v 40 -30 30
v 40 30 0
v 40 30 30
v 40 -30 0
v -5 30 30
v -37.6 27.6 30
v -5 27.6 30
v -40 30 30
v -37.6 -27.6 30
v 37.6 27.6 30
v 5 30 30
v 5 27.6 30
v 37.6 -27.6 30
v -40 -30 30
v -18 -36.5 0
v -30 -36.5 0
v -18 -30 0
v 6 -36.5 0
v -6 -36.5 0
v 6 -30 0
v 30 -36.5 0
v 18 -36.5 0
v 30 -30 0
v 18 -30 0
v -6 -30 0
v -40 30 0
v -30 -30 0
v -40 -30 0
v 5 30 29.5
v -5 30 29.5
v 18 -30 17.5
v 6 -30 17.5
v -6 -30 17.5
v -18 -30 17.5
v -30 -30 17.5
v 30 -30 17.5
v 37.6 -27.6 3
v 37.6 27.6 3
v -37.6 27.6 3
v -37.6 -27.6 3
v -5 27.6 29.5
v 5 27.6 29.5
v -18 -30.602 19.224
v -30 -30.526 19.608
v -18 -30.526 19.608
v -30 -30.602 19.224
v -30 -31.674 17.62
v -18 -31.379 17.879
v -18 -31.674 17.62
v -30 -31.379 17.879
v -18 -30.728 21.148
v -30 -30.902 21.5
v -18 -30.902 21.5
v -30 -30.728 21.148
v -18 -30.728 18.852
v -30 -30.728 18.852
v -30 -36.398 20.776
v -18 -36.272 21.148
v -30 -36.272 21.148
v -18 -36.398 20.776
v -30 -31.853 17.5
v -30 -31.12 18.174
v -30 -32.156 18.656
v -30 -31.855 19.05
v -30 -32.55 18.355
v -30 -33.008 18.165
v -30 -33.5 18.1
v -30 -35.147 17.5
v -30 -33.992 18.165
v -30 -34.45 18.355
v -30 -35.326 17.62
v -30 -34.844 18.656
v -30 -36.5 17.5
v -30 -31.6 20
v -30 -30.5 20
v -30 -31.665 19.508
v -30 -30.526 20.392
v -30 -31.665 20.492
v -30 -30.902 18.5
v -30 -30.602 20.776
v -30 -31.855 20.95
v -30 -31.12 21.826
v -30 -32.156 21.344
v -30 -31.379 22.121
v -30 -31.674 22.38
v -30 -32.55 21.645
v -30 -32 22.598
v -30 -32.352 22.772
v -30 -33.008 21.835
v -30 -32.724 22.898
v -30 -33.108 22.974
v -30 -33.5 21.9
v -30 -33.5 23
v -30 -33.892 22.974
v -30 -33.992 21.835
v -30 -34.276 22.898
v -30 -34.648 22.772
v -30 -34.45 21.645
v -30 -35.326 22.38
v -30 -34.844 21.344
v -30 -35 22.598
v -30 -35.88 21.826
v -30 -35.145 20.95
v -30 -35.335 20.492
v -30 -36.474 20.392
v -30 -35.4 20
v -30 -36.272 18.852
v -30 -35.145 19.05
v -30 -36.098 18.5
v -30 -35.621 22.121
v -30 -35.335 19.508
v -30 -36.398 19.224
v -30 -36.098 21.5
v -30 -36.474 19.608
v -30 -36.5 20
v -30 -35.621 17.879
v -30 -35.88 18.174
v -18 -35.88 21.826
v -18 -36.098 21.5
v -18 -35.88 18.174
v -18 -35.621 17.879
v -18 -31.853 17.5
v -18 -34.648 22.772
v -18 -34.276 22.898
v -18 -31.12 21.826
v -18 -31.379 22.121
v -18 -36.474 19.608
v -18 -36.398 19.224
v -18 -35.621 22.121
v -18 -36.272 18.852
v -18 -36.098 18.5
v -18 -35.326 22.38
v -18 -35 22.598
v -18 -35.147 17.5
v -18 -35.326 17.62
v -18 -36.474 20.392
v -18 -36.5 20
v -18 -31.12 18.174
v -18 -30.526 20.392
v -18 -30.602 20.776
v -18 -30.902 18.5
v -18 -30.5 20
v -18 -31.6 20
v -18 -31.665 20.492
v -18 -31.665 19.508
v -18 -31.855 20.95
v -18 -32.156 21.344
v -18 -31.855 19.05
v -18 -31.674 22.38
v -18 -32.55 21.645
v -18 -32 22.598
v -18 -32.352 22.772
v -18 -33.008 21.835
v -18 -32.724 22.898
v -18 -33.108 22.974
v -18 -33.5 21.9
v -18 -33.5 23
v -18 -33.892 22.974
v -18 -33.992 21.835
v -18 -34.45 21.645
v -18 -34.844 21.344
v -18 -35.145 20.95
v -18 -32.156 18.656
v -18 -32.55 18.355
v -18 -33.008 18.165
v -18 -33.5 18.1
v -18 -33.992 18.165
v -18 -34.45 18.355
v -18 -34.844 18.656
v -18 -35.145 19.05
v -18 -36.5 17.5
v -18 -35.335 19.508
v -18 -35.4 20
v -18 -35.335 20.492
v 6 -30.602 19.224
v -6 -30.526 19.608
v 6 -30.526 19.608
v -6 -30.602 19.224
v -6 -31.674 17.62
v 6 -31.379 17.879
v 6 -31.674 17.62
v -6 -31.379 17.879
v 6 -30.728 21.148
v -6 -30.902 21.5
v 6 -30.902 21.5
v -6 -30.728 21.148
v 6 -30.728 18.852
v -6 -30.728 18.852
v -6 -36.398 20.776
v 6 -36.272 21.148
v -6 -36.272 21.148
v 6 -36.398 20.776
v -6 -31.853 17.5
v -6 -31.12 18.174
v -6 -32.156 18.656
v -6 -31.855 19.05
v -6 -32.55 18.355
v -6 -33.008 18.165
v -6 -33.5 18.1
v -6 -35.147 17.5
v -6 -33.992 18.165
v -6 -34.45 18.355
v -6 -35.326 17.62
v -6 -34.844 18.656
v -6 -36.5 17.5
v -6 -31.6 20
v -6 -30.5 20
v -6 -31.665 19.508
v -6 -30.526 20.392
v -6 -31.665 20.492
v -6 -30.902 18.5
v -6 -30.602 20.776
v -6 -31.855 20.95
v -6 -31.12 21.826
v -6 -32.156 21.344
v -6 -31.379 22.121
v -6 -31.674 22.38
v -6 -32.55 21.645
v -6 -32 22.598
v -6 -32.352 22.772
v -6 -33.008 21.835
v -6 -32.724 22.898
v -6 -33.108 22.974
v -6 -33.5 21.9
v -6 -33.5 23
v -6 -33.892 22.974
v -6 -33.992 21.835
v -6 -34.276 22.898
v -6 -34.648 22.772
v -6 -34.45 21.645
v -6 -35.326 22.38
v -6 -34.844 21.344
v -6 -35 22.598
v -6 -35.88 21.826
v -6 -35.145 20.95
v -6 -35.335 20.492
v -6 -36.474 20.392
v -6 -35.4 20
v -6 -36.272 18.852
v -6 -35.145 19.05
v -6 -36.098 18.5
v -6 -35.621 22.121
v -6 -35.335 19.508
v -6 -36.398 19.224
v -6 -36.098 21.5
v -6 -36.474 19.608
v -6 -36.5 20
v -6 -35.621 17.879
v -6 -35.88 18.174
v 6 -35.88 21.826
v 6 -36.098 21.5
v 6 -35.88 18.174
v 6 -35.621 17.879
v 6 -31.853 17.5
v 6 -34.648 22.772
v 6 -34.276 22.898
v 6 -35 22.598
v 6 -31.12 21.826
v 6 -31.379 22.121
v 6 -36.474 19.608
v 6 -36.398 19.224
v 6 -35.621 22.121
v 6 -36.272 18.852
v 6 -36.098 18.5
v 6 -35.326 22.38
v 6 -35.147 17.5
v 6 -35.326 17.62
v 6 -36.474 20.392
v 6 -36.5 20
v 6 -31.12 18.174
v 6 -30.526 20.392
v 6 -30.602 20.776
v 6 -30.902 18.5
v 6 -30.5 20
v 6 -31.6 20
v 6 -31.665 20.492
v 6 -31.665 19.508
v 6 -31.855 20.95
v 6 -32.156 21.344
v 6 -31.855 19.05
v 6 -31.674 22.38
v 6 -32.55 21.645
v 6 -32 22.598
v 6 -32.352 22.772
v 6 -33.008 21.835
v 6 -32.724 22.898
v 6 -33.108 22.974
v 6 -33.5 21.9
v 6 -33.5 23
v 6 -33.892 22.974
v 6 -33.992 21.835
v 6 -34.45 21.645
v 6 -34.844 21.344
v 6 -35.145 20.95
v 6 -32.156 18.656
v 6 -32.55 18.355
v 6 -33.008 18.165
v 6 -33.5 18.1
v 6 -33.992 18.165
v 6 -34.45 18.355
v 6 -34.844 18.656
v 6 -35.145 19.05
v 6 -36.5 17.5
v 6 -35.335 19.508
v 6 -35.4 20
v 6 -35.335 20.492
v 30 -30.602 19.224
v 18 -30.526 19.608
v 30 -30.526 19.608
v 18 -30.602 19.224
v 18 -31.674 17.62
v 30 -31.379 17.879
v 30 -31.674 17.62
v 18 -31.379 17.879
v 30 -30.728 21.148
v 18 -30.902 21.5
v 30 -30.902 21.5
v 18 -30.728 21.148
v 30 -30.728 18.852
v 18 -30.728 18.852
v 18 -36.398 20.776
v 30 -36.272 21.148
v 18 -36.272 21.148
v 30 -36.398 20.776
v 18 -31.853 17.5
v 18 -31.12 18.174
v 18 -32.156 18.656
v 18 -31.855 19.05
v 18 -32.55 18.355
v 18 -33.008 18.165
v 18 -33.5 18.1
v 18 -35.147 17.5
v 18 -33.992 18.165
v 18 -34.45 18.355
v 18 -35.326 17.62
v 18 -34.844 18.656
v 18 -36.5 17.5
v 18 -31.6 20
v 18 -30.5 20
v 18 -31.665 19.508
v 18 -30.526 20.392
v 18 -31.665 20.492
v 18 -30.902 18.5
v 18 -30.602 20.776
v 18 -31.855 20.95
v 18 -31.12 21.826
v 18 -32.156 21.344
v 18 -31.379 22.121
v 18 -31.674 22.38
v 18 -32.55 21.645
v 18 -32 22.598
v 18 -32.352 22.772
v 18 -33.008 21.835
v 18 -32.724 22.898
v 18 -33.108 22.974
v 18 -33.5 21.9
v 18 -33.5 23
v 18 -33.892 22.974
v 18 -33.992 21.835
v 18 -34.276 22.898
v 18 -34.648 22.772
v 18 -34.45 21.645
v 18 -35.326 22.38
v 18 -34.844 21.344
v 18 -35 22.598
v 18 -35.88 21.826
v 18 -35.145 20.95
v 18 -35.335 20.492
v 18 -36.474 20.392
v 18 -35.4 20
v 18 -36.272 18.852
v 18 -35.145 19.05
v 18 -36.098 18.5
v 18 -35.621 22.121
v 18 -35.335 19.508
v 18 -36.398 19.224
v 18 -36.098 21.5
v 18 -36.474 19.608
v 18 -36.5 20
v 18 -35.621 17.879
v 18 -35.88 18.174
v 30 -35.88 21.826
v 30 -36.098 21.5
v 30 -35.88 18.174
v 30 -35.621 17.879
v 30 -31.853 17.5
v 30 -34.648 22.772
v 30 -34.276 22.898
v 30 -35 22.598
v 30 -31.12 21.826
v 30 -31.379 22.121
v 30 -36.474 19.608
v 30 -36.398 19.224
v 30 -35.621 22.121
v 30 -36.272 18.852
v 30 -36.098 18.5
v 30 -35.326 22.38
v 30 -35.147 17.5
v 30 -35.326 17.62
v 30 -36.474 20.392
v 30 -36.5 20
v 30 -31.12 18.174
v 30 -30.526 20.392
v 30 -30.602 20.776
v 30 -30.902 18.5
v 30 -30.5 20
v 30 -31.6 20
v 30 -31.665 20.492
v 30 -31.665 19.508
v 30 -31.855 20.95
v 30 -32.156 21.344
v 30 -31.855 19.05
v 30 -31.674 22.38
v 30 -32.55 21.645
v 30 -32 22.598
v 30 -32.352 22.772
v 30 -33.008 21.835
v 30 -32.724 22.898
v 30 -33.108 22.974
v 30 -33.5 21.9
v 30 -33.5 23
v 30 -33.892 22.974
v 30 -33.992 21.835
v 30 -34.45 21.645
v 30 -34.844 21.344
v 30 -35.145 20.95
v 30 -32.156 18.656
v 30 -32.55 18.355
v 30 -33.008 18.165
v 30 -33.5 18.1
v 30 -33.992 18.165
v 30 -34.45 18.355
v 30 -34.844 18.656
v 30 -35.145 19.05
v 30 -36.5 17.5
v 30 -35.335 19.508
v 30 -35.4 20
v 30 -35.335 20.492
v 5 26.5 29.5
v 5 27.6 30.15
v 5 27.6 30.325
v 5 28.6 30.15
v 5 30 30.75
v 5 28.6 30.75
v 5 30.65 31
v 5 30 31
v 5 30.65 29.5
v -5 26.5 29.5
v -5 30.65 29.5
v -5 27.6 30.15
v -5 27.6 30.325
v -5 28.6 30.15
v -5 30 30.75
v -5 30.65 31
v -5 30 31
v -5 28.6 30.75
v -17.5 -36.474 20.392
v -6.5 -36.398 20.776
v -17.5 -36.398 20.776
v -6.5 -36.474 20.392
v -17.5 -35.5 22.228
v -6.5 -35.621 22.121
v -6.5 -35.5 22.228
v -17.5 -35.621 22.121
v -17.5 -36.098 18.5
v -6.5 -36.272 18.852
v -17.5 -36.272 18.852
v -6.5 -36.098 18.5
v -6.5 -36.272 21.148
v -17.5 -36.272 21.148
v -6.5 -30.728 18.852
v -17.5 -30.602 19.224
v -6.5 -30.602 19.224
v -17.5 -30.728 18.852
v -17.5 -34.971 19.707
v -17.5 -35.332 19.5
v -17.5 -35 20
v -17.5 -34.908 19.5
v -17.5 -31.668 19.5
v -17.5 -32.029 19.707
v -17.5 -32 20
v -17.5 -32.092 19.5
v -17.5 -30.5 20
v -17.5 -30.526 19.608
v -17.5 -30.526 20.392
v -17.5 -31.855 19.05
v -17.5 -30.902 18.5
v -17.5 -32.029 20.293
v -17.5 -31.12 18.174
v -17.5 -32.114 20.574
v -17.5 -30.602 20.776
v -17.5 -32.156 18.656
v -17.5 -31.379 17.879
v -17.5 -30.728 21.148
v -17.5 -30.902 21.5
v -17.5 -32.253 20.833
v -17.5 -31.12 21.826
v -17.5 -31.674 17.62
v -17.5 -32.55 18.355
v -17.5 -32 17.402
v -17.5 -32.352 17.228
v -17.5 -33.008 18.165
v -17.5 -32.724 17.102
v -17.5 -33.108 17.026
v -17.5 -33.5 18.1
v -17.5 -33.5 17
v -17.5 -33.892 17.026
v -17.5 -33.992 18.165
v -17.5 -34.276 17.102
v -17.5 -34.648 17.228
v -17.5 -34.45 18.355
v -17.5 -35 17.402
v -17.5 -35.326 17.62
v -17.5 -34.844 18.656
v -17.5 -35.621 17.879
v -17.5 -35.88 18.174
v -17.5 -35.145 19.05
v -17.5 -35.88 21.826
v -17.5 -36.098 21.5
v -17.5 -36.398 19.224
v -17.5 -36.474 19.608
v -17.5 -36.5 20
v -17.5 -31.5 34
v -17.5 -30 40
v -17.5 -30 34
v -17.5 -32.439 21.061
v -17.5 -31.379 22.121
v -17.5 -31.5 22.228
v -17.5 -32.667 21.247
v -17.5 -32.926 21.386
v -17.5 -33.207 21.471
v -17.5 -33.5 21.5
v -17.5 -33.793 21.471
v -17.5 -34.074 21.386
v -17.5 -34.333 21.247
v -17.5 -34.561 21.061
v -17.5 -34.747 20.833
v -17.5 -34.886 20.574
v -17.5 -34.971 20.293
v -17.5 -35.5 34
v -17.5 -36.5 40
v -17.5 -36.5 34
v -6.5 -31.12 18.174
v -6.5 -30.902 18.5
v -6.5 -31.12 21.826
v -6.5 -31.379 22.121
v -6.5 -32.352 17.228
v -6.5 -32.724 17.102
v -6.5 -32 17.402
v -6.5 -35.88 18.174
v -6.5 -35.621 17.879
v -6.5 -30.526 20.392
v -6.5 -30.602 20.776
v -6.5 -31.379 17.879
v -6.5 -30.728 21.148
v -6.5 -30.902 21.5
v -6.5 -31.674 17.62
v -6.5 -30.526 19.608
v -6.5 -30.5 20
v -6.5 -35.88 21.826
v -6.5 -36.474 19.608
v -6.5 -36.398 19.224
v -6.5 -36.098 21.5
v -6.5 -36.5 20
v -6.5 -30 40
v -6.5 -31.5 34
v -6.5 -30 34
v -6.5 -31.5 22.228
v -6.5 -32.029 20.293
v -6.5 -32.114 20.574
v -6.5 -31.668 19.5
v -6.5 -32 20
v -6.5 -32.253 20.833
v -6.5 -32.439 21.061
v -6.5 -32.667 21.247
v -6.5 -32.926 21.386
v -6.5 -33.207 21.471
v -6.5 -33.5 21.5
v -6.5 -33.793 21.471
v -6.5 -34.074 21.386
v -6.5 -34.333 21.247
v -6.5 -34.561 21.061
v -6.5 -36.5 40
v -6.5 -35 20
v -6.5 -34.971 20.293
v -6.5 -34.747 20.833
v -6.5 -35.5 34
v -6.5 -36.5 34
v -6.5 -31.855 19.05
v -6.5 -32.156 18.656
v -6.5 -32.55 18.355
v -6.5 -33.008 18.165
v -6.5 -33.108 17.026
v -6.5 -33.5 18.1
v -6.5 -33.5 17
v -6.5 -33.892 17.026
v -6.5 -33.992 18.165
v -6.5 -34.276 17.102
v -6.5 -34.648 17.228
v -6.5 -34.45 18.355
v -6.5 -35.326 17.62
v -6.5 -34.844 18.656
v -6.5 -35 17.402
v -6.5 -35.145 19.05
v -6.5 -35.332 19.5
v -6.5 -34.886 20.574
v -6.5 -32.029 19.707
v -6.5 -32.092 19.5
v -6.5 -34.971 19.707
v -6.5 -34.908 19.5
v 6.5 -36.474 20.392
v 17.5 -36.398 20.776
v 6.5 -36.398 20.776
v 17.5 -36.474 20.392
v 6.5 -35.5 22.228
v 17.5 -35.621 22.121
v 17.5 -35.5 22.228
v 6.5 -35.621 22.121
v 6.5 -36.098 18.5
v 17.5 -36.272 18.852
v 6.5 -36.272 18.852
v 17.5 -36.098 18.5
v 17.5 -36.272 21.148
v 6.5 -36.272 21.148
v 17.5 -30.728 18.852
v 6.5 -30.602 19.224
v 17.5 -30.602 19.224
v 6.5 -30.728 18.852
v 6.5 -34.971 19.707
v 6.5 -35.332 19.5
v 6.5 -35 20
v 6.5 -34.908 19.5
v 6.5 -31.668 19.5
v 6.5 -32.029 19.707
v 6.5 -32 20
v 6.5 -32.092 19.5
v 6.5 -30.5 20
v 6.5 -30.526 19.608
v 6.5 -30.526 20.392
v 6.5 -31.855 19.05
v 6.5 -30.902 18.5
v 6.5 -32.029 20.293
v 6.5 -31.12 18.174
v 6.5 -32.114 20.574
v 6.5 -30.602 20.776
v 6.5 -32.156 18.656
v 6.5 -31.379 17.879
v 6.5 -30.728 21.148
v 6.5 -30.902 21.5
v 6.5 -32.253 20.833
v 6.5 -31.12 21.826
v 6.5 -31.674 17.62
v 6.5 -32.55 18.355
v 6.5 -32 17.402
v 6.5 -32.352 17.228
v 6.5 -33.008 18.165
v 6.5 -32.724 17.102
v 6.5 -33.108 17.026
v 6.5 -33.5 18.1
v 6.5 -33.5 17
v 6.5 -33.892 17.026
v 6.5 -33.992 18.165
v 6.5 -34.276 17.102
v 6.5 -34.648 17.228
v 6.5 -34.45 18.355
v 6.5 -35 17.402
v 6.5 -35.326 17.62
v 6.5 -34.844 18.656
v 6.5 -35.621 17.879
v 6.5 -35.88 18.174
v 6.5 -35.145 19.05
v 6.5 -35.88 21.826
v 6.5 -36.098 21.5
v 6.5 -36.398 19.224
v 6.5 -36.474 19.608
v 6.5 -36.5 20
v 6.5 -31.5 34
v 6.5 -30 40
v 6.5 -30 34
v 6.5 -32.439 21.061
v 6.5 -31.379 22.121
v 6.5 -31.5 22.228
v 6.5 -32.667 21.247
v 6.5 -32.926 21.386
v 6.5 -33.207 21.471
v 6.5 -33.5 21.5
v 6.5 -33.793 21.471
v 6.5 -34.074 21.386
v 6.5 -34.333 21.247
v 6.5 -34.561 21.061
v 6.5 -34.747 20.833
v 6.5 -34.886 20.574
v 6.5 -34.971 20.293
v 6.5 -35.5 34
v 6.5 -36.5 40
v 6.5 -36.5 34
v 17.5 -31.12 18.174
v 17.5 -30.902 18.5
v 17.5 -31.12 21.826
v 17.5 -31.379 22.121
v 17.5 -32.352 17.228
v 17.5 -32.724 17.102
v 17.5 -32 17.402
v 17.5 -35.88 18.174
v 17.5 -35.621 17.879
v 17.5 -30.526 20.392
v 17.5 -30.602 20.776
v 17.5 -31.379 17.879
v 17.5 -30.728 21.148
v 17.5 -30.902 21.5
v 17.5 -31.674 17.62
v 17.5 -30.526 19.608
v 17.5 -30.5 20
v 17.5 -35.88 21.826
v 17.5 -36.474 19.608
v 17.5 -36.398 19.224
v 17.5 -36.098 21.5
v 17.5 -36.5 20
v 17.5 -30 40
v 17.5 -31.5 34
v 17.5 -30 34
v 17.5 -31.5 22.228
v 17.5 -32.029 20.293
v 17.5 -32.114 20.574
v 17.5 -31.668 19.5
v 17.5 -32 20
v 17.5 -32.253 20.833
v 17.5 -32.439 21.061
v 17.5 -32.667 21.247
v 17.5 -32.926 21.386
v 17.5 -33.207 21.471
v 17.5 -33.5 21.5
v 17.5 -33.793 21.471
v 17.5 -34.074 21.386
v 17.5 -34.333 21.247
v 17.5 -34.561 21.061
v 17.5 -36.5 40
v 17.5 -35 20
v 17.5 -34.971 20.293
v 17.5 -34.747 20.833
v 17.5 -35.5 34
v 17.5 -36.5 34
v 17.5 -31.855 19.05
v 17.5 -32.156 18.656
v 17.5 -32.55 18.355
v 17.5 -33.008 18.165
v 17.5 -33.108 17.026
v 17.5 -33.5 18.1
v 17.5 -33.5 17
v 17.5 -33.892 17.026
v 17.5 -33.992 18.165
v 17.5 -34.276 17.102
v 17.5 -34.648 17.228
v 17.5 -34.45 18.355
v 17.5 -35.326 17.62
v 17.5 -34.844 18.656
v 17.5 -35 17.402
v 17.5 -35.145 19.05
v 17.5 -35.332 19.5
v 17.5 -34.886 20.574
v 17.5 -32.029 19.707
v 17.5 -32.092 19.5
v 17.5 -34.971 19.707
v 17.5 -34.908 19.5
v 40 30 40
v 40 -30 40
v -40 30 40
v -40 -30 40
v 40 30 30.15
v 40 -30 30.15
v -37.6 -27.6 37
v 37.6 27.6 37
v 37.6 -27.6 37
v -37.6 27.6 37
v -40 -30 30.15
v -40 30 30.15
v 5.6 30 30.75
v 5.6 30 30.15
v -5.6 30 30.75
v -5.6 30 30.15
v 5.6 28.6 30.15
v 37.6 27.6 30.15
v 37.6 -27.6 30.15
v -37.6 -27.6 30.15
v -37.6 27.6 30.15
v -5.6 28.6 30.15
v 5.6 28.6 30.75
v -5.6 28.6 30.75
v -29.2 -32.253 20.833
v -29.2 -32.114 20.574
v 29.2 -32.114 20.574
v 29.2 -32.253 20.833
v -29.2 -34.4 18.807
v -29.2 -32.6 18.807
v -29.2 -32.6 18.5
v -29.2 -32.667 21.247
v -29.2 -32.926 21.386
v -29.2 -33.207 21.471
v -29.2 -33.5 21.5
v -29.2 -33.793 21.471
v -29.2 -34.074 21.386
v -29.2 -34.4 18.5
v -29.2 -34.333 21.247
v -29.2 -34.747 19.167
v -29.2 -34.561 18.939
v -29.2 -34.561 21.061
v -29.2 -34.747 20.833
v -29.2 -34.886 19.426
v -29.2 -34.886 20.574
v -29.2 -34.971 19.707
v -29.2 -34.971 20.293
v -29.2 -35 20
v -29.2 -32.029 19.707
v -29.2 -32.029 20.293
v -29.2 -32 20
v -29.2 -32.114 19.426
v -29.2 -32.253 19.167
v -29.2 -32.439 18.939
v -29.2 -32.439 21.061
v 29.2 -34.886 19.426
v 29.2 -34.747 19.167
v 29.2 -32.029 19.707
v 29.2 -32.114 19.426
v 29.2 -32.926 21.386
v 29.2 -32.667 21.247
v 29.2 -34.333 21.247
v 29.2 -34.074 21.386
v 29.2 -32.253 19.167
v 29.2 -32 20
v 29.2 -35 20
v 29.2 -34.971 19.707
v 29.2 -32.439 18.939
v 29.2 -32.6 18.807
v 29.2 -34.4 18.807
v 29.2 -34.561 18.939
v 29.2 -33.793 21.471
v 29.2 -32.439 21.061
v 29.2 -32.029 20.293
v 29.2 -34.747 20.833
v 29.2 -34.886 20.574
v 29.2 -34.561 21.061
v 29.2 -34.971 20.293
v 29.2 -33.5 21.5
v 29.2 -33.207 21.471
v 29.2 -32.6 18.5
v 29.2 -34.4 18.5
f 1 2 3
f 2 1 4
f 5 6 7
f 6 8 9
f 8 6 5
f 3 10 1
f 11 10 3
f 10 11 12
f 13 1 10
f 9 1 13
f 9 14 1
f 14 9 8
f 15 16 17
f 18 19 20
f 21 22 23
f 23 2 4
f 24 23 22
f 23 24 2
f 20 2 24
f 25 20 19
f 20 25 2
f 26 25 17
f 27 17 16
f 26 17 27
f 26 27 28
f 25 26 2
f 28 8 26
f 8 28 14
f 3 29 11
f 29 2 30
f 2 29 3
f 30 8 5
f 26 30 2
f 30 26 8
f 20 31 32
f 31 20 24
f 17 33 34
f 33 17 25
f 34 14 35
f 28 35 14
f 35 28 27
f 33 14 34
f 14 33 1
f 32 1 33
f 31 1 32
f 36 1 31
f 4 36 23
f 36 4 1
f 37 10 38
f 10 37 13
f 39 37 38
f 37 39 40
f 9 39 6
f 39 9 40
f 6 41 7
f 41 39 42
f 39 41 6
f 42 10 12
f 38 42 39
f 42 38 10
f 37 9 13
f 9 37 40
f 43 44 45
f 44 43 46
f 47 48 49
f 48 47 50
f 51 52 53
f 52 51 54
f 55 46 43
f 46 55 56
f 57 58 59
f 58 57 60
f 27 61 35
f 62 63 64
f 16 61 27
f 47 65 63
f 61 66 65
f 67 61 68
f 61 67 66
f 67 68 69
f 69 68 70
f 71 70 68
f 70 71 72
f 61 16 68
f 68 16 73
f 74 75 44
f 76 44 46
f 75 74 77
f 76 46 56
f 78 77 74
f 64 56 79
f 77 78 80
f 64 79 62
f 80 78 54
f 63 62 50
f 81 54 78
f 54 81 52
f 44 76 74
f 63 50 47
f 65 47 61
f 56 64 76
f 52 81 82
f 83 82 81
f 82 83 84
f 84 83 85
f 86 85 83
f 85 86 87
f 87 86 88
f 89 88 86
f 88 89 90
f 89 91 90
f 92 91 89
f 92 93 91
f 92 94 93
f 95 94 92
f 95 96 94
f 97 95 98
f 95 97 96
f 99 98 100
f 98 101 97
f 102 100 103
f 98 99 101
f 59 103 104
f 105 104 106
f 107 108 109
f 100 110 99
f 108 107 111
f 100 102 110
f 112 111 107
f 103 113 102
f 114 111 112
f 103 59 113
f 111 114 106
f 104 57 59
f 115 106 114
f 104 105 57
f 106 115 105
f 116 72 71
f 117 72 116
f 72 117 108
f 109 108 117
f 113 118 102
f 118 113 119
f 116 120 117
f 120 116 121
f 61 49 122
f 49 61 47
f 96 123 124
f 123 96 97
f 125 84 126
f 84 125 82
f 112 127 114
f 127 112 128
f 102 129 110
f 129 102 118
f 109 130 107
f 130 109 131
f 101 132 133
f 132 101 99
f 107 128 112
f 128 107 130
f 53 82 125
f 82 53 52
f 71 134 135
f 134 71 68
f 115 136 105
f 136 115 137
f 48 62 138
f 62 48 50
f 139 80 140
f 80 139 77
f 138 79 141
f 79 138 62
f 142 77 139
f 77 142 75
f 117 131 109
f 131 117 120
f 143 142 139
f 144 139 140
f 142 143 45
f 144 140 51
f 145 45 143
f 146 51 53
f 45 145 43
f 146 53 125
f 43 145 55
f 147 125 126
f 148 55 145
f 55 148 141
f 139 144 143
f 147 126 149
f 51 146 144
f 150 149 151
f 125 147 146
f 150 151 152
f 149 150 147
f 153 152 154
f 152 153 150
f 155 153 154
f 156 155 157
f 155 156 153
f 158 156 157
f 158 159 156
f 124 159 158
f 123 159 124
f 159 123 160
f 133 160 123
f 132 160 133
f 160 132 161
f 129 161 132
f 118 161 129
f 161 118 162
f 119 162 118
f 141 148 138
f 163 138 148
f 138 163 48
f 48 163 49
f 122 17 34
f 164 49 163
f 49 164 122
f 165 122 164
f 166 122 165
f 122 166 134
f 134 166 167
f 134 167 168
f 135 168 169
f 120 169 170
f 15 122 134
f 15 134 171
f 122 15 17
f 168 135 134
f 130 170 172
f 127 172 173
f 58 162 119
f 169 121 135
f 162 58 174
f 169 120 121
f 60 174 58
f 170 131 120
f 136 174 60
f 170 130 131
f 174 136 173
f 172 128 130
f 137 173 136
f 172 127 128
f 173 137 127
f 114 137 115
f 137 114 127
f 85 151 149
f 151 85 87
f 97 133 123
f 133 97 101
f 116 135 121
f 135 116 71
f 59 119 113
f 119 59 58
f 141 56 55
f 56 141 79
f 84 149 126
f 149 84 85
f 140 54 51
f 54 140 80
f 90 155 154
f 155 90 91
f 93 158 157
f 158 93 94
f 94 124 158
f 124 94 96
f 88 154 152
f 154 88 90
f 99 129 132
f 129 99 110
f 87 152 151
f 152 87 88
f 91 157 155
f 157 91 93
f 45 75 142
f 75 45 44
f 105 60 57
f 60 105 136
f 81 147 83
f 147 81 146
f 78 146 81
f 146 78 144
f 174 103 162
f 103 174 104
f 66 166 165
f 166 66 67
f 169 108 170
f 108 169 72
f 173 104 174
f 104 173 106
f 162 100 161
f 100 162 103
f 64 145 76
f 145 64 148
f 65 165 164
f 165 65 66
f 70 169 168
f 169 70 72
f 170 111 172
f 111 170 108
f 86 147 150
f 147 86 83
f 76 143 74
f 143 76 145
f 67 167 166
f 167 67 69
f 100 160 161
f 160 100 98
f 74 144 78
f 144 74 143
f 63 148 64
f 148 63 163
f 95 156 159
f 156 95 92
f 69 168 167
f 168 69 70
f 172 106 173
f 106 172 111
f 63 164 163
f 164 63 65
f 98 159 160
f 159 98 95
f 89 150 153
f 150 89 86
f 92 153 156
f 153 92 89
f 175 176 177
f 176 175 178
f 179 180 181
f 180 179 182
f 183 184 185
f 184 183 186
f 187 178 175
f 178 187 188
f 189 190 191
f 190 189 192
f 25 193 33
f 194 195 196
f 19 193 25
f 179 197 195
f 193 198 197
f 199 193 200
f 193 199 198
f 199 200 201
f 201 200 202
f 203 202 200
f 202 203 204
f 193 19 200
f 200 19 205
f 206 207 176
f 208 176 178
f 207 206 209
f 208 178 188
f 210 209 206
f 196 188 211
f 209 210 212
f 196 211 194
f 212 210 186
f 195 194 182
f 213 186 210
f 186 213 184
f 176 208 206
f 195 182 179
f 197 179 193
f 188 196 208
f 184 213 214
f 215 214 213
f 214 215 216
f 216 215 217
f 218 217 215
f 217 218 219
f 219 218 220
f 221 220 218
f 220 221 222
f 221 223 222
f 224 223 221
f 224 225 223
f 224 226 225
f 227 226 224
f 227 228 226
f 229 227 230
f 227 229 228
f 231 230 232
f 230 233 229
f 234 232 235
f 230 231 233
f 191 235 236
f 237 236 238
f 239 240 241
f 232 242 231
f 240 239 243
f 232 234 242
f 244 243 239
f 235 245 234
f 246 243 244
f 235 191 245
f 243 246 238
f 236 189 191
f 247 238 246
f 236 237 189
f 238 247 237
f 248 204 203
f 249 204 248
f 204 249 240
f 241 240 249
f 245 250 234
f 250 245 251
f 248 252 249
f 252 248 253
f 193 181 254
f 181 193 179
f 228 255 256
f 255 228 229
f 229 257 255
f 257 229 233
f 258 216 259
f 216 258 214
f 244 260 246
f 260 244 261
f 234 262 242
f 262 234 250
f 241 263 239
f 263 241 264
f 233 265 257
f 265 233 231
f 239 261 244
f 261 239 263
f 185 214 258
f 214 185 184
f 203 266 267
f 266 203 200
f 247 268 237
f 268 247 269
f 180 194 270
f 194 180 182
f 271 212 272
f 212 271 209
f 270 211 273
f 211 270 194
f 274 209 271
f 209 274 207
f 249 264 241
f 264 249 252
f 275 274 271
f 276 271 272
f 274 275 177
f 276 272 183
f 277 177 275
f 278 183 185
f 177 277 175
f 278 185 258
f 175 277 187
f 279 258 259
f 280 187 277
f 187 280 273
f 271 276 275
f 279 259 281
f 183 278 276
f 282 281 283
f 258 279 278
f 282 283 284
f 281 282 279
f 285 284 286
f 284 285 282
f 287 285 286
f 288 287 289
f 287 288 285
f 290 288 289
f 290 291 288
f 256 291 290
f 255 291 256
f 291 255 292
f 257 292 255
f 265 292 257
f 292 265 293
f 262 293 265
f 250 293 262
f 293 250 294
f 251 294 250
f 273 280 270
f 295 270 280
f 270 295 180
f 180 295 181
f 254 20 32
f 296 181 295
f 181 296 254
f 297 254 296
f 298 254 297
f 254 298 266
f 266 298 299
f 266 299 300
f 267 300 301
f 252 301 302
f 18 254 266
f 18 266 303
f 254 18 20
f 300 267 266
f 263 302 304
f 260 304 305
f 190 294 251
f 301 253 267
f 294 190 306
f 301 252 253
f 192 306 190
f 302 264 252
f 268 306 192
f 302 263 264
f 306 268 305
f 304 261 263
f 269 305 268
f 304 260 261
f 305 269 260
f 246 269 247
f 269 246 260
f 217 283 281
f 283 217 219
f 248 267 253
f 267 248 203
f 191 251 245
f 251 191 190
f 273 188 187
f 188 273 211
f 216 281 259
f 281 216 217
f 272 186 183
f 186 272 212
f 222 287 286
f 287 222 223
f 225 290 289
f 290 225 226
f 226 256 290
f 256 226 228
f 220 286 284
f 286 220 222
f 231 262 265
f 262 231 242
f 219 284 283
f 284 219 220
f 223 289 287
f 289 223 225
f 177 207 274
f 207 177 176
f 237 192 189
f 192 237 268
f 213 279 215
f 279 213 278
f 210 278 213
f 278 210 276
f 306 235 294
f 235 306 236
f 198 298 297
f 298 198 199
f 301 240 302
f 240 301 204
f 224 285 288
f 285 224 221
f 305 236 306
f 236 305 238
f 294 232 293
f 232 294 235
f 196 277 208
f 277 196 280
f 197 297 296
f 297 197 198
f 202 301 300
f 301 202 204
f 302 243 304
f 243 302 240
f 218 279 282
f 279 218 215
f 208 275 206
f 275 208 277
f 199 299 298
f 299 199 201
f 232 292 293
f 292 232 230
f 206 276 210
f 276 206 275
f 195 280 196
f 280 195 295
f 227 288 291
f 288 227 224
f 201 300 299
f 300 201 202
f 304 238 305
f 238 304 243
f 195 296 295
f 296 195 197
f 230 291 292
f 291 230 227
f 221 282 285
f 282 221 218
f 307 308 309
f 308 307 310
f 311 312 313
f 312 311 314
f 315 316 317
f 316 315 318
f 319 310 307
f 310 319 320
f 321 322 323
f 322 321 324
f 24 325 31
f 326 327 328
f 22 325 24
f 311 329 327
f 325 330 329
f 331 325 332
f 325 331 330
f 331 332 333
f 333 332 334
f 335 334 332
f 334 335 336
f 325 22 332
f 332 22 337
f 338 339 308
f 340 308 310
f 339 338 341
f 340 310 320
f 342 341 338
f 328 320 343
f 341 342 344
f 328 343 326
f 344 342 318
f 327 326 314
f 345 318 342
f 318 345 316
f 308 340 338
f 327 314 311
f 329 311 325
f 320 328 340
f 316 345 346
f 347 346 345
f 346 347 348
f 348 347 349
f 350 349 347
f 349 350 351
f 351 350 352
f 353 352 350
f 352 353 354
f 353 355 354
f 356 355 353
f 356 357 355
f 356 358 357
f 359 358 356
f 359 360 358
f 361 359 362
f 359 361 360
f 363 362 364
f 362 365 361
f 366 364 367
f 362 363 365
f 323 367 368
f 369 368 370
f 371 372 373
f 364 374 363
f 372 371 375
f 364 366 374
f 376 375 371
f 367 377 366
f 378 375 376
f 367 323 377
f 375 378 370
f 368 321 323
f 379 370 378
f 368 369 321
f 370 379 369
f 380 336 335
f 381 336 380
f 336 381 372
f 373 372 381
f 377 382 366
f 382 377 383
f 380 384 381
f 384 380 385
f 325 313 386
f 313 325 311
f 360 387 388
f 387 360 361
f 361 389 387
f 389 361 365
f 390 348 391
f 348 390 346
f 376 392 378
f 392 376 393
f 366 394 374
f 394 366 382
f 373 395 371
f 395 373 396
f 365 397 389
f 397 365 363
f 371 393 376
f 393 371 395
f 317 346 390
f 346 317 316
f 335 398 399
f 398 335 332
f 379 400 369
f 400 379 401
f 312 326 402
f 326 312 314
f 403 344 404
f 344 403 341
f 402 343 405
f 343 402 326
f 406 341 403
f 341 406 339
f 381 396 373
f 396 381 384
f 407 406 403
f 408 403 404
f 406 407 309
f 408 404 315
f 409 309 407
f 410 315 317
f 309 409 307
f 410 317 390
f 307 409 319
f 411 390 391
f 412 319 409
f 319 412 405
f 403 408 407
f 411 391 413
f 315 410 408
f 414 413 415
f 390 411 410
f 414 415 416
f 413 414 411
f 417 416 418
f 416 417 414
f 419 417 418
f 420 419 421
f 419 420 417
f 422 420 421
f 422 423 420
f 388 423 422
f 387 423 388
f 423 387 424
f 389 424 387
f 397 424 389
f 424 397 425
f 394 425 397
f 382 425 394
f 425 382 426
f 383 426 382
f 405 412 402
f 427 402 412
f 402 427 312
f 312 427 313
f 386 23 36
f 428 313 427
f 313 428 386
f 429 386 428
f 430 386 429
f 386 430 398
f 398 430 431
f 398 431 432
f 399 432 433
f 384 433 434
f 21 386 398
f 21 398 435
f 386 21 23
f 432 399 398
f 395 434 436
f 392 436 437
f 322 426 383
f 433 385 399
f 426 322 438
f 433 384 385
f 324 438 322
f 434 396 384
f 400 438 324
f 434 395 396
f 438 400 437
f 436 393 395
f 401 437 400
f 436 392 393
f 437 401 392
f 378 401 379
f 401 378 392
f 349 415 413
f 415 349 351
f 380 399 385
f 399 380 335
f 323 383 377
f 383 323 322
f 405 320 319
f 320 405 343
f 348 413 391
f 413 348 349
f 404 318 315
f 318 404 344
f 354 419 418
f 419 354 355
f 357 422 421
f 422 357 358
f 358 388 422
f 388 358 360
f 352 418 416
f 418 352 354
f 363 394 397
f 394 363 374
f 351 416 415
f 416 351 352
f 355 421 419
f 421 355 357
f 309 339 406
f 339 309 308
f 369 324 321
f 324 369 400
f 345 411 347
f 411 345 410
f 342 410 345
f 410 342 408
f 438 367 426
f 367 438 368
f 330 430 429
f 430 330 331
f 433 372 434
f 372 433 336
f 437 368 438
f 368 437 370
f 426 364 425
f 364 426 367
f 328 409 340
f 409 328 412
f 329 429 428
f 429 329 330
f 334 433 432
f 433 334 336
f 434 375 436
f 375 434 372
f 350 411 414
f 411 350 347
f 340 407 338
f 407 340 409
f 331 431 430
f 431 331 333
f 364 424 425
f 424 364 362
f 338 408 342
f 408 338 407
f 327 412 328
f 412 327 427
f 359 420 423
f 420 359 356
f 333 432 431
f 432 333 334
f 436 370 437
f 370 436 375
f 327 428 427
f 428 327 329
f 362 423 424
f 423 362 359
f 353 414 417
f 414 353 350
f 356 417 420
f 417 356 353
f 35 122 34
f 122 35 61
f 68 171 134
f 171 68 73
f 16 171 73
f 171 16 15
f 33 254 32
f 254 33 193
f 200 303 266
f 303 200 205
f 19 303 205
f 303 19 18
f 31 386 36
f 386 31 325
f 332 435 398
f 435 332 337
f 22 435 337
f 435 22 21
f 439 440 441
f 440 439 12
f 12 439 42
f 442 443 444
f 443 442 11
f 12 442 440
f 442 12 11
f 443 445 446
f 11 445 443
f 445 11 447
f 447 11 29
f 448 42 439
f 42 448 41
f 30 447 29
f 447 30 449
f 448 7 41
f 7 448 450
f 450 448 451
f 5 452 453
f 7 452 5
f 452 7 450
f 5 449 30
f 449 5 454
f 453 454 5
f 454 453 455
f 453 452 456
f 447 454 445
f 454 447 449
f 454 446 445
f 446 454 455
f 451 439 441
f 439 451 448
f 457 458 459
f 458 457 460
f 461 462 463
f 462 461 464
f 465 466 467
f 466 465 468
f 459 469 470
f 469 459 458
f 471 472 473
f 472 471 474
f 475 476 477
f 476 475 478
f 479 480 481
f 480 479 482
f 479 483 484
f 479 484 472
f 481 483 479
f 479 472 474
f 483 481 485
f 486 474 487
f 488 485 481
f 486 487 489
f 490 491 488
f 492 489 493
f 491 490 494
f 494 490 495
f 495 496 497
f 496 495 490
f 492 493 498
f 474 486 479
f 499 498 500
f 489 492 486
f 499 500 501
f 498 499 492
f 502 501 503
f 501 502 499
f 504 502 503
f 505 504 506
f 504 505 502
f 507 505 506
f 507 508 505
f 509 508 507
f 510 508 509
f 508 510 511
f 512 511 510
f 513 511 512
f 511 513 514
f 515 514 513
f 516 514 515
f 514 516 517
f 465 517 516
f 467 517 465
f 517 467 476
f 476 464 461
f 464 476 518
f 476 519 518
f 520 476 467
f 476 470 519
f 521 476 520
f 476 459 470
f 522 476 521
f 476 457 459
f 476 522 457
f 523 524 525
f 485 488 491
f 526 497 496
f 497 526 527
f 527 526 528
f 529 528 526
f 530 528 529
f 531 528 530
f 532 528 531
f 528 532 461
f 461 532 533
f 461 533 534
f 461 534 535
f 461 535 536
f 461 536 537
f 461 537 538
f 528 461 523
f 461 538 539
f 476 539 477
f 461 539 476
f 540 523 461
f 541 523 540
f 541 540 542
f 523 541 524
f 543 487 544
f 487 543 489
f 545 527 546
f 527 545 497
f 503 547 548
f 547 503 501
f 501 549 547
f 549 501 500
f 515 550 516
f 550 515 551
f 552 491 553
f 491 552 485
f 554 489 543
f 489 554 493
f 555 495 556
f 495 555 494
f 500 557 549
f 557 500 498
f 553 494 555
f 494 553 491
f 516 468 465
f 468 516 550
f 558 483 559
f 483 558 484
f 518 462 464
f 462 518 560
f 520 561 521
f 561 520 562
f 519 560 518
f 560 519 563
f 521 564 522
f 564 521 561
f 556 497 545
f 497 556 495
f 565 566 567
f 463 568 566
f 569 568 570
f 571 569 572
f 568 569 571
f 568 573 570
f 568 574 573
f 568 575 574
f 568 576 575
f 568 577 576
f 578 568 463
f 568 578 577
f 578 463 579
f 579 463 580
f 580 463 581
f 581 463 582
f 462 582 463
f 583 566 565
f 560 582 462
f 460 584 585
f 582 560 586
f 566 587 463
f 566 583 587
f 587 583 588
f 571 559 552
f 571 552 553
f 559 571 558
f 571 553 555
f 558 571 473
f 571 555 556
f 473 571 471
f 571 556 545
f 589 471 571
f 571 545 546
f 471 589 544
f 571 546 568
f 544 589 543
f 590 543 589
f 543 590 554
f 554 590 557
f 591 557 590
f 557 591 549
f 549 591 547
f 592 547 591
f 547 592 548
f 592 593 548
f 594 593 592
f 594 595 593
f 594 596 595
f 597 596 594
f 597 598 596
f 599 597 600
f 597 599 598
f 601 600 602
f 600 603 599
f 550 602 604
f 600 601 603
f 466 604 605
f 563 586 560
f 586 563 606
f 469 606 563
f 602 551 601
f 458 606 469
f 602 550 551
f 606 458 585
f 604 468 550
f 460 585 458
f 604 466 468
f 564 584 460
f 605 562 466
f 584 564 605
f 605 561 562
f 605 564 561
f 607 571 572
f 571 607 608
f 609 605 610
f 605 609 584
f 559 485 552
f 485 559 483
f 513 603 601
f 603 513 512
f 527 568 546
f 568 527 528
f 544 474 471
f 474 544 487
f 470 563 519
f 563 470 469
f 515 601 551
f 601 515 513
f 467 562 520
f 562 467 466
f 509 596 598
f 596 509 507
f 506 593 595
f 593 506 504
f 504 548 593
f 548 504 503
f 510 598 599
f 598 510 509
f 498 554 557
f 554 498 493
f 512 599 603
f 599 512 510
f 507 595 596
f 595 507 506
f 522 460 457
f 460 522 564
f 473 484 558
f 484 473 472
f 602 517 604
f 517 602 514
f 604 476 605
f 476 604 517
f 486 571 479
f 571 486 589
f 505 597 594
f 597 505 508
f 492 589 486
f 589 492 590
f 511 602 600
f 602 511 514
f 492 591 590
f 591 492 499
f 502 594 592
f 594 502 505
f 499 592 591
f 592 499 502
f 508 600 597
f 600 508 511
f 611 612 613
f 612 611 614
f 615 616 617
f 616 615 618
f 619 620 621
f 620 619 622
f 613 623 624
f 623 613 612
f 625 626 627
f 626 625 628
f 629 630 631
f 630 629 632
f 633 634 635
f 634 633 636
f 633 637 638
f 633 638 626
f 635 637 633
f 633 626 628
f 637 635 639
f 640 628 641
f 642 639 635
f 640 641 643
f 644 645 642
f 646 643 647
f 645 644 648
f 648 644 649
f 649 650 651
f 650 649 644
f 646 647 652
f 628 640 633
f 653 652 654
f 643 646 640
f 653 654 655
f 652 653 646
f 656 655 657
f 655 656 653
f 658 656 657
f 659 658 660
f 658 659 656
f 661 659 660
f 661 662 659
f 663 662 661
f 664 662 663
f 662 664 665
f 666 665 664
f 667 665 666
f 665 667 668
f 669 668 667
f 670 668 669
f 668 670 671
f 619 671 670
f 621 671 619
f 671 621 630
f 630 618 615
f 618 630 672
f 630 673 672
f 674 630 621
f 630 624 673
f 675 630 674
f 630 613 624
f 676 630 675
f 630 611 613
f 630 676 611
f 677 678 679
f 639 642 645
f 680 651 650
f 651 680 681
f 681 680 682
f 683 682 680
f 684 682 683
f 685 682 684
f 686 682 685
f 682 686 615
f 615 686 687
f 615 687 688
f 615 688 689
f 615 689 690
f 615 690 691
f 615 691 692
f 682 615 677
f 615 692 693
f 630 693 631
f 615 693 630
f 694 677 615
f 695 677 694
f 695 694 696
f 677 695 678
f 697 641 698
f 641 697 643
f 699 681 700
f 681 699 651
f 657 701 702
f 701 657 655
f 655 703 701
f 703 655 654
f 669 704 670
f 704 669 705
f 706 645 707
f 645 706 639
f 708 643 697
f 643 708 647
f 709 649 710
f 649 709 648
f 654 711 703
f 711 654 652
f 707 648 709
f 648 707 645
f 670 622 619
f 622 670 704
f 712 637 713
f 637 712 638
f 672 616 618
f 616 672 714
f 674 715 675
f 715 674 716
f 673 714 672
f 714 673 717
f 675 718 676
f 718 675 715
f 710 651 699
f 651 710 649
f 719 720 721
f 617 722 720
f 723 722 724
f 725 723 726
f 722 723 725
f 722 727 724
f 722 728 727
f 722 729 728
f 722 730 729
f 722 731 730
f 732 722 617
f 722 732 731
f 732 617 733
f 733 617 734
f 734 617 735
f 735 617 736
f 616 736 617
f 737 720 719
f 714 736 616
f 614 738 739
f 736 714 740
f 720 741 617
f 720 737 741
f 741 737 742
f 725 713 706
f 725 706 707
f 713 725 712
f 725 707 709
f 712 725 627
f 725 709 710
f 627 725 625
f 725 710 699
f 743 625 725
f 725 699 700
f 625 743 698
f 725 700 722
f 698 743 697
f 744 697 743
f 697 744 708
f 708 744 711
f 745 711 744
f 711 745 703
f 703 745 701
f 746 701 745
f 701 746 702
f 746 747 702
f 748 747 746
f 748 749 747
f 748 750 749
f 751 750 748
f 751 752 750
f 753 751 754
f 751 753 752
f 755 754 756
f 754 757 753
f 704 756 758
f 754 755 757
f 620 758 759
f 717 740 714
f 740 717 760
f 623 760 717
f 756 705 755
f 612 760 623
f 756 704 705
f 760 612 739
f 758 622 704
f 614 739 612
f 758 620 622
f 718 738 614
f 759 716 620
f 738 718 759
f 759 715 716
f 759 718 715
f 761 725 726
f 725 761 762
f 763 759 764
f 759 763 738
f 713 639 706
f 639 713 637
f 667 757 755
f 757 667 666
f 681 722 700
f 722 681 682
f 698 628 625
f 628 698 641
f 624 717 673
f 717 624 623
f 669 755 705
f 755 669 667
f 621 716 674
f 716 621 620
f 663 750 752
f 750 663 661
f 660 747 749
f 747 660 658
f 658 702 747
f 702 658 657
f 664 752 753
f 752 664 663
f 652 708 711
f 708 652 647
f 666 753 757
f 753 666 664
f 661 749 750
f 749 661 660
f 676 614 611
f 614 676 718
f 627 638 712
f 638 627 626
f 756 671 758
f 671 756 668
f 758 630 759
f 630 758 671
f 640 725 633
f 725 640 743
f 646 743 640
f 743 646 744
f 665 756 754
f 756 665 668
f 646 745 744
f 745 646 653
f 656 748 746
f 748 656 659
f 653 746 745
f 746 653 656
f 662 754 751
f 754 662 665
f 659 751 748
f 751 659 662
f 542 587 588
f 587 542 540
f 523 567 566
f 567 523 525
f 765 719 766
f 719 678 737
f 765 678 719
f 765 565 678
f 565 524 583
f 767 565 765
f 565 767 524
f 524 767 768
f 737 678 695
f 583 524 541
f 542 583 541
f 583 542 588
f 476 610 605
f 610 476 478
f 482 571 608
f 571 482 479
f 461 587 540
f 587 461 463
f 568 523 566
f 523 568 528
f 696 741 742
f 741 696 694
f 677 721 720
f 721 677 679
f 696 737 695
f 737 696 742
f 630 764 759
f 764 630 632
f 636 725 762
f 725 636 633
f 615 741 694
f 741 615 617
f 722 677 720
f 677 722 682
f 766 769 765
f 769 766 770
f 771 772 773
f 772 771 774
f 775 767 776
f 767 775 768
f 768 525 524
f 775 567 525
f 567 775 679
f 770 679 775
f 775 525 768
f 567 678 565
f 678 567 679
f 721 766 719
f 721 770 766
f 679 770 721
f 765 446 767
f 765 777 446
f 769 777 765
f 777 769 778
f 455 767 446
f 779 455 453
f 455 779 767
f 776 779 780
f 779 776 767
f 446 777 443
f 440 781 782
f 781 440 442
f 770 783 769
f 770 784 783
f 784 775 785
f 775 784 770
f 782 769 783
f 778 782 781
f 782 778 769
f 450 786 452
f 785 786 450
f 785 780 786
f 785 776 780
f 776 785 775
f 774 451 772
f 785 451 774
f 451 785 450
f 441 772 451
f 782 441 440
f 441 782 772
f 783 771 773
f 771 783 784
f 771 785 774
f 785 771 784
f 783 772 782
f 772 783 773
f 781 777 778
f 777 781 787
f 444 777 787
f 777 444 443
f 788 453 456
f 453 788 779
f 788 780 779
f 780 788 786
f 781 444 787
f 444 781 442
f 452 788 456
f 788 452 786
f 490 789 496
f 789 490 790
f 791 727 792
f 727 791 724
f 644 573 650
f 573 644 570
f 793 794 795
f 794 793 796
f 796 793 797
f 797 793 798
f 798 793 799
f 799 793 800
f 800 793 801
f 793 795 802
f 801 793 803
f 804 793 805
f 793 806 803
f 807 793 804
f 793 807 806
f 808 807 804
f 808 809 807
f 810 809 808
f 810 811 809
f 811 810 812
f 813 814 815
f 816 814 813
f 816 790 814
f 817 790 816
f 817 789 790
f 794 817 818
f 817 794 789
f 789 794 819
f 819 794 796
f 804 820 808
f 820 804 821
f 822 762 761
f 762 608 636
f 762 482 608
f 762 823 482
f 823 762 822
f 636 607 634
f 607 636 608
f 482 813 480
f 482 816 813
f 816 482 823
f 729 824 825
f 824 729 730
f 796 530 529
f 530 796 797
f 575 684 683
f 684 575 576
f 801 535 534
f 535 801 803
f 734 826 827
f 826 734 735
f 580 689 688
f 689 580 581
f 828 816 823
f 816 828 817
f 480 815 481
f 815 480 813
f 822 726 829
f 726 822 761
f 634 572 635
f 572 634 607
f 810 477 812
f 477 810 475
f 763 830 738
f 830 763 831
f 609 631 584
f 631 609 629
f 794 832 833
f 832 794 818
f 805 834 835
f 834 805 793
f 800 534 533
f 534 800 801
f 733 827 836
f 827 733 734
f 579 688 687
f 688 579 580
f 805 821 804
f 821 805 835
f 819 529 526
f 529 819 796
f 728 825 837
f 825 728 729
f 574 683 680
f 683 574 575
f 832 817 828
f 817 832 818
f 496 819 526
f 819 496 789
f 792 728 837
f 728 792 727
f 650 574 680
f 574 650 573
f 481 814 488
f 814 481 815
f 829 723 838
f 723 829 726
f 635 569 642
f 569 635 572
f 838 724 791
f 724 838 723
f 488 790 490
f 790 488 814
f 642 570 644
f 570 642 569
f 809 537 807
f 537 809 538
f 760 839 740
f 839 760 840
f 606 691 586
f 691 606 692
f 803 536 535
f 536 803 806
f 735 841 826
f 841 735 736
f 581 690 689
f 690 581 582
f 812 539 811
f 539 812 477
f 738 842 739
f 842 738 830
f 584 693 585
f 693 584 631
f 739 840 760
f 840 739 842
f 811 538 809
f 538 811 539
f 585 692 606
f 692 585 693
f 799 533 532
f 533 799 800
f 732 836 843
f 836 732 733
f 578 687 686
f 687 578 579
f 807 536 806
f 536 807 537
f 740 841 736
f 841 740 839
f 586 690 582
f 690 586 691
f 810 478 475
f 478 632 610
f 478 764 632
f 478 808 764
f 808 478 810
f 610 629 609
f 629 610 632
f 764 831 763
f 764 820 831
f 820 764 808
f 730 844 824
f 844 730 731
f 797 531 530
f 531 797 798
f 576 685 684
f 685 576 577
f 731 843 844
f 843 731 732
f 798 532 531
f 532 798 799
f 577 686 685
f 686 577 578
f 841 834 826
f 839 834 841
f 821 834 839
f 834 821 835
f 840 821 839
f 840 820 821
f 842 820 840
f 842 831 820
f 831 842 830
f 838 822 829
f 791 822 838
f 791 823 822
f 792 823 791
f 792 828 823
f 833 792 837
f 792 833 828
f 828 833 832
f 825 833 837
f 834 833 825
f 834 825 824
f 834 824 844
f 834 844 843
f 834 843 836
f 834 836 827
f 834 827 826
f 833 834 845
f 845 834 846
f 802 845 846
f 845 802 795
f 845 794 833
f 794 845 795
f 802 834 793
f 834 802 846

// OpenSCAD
part = "assembly"; // [base, lid, pin, assembly]
cadverify_only = "";
module instance(name, part, unit = 1) {
  echo(cadverify_instance = [name, part, unit]);
  if (cadverify_only == "" || cadverify_only == name) children();
}
Ya = -33.5; Za = 20; Kr = 3.0; Br = 1.9; Pr = 1.5;
BX = [[-30,-18],[-6,6],[18,30]];
LX = [[-17.5,-6.5],[6.5,17.5]];
module barrelX(x0, x1) {
  difference() {
    translate([0,Ya,Za]) rotate([0,90,0]) translate([0,0,(x0+x1)/2])
      cylinder(h=x1-x0, r=Kr, center=true, $fn=48);
    translate([0,Ya,Za]) rotate([0,90,0]) translate([0,0,(x0+x1)/2])
      cylinder(h=(x1-x0)+1.0, r=Br, center=true, $fn=24);
  }
}
module base_geom() {
  union() {
    difference() {
      translate([-40,-30,0]) cube([80,60,30]);
      translate([-37.6,-27.6,3]) cube([75.2,55.2,27.01]);
    }
    for (b=BX) {
      translate([b[0],-36.5,0]) cube([b[1]-b[0],6.5,17.5]);
      barrelX(b[0], b[1]);
    }
    translate([5,0,0]) rotate([0,-90,0]) linear_extrude(height=10)
      polygon([[29.5,26.5],[31,28.5],[31,30.65],[29.5,30.65]]);
  }
}
module lid_open() {
  difference() {
    union() {
      translate([-40,-97,0]) cube([80,60,3]);
      translate([-40,-97,3]) cube([80,2.4,6.85]);
      translate([-40,-39.4,3]) cube([80,2.4,6.85]);
      translate([-40,-97,3]) cube([2.4,60,6.85]);
      translate([37.6,-97,3]) cube([2.4,60,6.85]);
      for (b=LX) {
        translate([b[0],-39,0]) cube([b[1]-b[0],8.5,6]);
        translate([b[0],-35.5,3]) cube([b[1]-b[0],4,17.5]);
        barrelX(b[0], b[1]);
      }
    }
    translate([-5.6,-98.6,9.25]) cube([11.2,3,0.76]);
  }
}
module pin_geom() {
  union() {
    translate([-29.2,0,1.5]) rotate([0,90,0])
      cylinder(h=58.4, r=Pr, center=false, $fn=32);
    translate([-29.2,-0.9,0]) cube([58.4,1.8,0.6]);
  }
}
module lid_closed() {
  translate([0,Ya,Za]) rotate([180,0,0]) translate([0,-Ya,-Za]) lid_open();
}
module pin_placed() {
  translate([0,Ya,Za-1.5]) pin_geom();
}
if (part=="base") {
  base_geom();
  echo(cadverify_spec=[
    ["bounds", [[-40,-36.5,0],[40,31,30.65]]],
    ["bodies", 1],
    ["support_faces", [["base","-z",4000]]],
    ["overhangs_allowed", [["hinge", [[-30,-37,16],[30,-30,24]]]]],
    ["copies", 1],
    ["details", [
      ["bottom","thickness",[0,0,-1],[0,0,1],3],
      ["cavity","void",[[-37.6,-27.6,3],[37.6,27.6,30]],0.9],
      ["knuckle","material",[[-30,-36.5,17],[-18,-30.5,23]],0.5],
      ["bore","hole",[-31,-33.5,20],[1,0,0],[[0,3.8],[10,3.8]]],
      ["catch","material",[[-5,30,26.5],[5,31,30.65]],0.6]
    ]]
  ]);
} else if (part=="lid") {
  lid_open();
  echo(cadverify_spec=[
    ["bounds", [[-40,-97,0],[40,-30.5,23.5]]],
    ["bodies", 1],
    ["support_faces", [["lid","-z",4000]]],
    ["overhangs_allowed", [["hinge", [[-30,-37,16],[30,-30,24]]]]],
    ["copies", 1],
    ["details", [
      ["plate","thickness",[0,-67,-1],[0,0,1],3],
      ["pocket","void",[[-37.6,-94.6,3],[37.6,-39.4,9.85]],0.9],
      ["knuckle","material",[[-17.5,-36.5,17],[-6.5,-30.5,23]],0.8],
      ["bore","hole",[-18,-33.5,20],[1,0,0],[[0,3.8],[9,3.8]]],
      ["notch","void",[[-5.6,-97,9.25],[5.6,-95.6,9.85]],0.9]
    ]]
  ]);
} else if (part=="pin") {
  pin_geom();
  echo(cadverify_spec=[
    ["bounds", [[-29.2,-1.5,0],[29.2,1.5,3]]],
    ["bodies", 1],
    ["support_faces", [["pin","-z",50]]],
    ["overhangs_allowed", [["flanks", [[-29.2,-1.5,0],[29.2,1.5,3]]]]],
    ["copies", 1],
    ["details", [
      ["shaft","thickness",[0,5,1.5],[0,-1,0],3]
    ]]
  ]);
} else {
  instance("base","base") base_geom();
  instance("lid","lid") lid_closed();
  instance("pin","pin") pin_placed();
  echo(cadverify_spec=[
    ["bounds", [[-40,-36.5,0],[40,31,40]]],
    ["support_faces", [["bed","-z",4000]]],
    ["motions", [["swing",["lid"],"rotate",[0,-33.5,20],[1,0,0],[0,180],["flex",[["lid","base",0.5,"catch entry"]]]]]],
    ["assembly_order", [[["base"],[0,0,0]],[["lid"],[0,0,1]],[["pin"],[-1,0,0]]]],
    ["print_in_place", 0.4],
    ["print_pose", [["swing",180]]],
    ["overhangs_allowed", [["hinge", [[-30,-37,16],[30,-30,24]]]]]
  ]);
}
